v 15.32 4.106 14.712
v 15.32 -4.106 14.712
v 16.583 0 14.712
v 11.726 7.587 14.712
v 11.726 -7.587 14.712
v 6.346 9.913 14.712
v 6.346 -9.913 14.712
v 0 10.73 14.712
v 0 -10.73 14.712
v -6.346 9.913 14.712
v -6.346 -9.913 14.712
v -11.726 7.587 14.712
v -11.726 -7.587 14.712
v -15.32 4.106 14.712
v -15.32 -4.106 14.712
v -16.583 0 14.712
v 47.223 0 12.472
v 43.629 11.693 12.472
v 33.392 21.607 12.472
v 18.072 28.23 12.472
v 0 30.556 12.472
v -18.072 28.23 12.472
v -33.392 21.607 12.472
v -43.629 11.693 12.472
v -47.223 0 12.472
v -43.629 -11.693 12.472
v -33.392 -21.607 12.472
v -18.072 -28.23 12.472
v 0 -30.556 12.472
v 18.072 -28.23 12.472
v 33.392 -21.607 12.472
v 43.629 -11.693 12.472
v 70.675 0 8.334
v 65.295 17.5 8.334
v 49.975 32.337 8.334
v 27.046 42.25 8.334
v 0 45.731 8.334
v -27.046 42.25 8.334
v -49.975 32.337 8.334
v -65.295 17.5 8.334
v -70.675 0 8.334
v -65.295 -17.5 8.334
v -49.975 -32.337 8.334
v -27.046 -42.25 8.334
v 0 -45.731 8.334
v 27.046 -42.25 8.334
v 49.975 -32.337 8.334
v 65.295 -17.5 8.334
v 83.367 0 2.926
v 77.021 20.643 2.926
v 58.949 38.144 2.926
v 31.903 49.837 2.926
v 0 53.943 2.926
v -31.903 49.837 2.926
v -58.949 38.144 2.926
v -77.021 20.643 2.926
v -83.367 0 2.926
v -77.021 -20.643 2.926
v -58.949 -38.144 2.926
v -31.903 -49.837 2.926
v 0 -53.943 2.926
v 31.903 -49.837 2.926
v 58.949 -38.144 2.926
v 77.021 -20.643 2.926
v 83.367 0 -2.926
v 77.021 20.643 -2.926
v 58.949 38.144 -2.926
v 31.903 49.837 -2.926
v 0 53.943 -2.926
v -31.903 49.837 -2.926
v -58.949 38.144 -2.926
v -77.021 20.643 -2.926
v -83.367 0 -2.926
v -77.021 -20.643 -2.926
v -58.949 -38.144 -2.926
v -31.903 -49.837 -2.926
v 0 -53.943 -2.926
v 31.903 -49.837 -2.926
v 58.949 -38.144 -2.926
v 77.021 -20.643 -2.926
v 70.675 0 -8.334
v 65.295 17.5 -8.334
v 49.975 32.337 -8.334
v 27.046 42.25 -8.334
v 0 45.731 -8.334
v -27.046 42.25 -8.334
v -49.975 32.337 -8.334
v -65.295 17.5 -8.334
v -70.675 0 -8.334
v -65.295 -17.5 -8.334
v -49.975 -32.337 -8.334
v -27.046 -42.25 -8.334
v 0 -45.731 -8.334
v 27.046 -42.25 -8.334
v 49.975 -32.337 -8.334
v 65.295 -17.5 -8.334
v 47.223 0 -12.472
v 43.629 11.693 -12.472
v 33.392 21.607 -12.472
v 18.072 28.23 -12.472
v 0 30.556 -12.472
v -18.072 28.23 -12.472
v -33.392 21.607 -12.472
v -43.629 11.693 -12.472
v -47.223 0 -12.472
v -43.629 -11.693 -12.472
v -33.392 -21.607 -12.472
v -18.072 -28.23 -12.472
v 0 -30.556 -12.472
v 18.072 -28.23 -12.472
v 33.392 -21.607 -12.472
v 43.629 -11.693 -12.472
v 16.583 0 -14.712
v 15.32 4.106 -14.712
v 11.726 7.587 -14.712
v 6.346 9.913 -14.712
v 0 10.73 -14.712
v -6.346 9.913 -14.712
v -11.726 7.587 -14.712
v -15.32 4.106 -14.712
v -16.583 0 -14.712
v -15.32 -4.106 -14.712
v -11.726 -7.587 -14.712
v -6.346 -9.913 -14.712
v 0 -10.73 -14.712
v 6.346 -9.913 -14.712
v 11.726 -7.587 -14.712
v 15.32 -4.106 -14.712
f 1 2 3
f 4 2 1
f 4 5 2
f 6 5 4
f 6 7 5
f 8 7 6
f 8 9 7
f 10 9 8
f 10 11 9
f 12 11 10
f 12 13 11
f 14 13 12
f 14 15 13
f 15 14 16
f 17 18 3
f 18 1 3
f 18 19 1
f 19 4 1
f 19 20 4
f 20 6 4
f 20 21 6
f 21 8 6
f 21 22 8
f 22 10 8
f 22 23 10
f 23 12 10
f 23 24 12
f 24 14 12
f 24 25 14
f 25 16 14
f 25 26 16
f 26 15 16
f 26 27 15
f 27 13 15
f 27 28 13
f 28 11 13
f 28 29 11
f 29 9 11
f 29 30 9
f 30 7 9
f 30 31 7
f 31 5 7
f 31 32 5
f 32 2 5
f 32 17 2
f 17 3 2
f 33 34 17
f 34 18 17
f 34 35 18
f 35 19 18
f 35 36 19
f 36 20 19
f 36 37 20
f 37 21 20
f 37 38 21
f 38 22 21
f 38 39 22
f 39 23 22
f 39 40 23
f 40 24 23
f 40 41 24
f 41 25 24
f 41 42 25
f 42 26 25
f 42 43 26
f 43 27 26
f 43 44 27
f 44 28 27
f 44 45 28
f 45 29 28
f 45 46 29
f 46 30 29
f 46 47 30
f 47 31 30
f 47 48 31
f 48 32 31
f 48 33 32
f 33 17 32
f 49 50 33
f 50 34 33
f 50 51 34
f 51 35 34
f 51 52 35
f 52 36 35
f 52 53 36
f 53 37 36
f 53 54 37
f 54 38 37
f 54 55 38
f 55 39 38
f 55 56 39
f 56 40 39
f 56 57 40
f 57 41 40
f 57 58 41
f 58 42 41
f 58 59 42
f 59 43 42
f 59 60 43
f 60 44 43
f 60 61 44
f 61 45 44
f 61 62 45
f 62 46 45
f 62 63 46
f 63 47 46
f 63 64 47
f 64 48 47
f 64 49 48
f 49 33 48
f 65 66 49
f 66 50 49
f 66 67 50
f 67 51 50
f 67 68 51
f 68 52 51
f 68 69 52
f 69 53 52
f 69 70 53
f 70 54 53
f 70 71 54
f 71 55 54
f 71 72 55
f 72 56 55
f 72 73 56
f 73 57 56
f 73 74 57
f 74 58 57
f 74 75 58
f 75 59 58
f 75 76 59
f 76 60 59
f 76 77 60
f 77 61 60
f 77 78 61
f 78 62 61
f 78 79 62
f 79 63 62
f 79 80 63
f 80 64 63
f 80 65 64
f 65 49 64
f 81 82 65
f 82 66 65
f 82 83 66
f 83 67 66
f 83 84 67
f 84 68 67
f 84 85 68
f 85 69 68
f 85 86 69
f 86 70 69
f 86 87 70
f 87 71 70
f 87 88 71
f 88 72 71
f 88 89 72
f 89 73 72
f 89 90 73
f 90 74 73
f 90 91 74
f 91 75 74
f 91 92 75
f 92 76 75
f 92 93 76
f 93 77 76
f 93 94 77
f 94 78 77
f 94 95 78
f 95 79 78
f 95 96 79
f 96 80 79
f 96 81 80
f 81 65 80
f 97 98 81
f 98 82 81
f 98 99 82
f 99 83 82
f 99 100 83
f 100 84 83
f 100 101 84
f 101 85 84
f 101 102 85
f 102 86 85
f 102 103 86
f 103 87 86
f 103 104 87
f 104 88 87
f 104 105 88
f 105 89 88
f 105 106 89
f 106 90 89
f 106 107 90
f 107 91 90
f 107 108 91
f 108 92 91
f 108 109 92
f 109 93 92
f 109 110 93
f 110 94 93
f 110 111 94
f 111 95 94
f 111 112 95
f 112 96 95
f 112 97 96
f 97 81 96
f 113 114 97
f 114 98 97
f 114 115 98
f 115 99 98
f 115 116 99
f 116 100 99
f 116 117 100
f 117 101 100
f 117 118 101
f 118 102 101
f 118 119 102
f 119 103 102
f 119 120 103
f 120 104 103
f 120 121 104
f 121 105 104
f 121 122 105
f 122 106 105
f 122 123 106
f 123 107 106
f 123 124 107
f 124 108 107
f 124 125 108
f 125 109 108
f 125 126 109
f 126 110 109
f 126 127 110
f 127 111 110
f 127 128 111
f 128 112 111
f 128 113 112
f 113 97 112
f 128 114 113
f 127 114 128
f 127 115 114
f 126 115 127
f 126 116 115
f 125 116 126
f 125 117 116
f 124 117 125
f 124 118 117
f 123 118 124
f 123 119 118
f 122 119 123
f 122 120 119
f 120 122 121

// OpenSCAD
// Generated by SolidPython 1.0.1 on 2020-07-29 00:46:53


scale(v = [17, 11, 3]) {
	sphere(r = 5);
}
/***********************************************
*********      SolidPython code:      **********
************************************************
 
# import packages: SolidPython
from solid import *
from solid.utils import *
from itertools import chain, combinations, permutations


class Resize:

    def __init__(self, scad_file):
        self.scad_file = scad_file
        #self.scad_file = import_scad(scad_file)
        # cone/cylinder param:
        self.r1 = 0
        self.r2 = 0
        self.h = 0
        # rectangular prism param:
        self.w = 0
        self.l = 0
        # ellipse param:
        self.r = 0

    # import OpenScad code (file name corresponds to shape)


    # classify shape + parameters
    def assign(self, param1, param2, param3):
        if self.scad_file == 'cone.scad':
            self.r1 = param1
            self.r2 = param2
            self.h = param3
        elif self.scad_file == 'cylinder.scad':
            self.r1 = param1
            self.r2 = param2
            self.h = param3
        elif self.scad_file == 'rectangularPrism.scad':
            self.h = param1
            self.l = param2
            self.w = param3
        else:
            self.r = param1
            self.h = param2

    # resize parameters
    def iterate(self):
        x = range(3, 20, 2)
        i = 1
        if self.scad_file == 'cone.scad':
            tempList = list(permutations(x, 2))
            for temp in tempList:
                param1 = temp[0]
                param2 = temp[1]
                filepath = 'produced_scad_files/' + 'cone' + str(param1) + '_' + str(param2) + '_' + '.scad'
                scad_render_to_file(cylinder(h=param1, r1=param2, r2=0), filepath)

        elif self.scad_file == 'cylinder.scad':
            tempList = list(permutations(x, 3))
            for temp in tempList:
                param1 = temp[0]
                param2 = temp[1]
                filepath = 'produced_scad_files/' + 'cylinder' + str(param1) + '_' + str(param2) + '_' + '.scad'
                scad_render_to_file(cylinder(h=param1, r1=param2, r2=param2), filepath)

        elif self.scad_file == 'rectangularPrism.scad':
            tempList = list(permutations(x, 3))
            for temp in tempList:
                param1 = temp[0]
                param2 = temp[1]
                param3 = temp[2]
                filepath = 'produced_scad_files/' + 'rectangularPrism' + str(param1) + '_' + str(param2) + '_' + str(
                    param3) + '.scad'
                scad_render_to_file(cube(size=(param1, param2, param3)), filepath)

        elif self.scad_file == 'ellipse.scad':
            tempList = list(permutations(x, 4))
            for temp in tempList:
                param1 = temp[0]
                param2 = temp[1]
                param3 = temp[2]
                param4 = temp[3]
                filepath = 'produced_scad_files/' + 'ellipse' + str(param1) + '_' + str(param2) + '_' + str(param3) + '_' + str(param4) + '.scad'
                scad_render_to_file(scale([param1, param2, param3])(sphere(r=param4)), filepath)

    def render_to_scadfile(self):
        scad_render_to_file(scad, 'example.scad') 
 
************************************************/
